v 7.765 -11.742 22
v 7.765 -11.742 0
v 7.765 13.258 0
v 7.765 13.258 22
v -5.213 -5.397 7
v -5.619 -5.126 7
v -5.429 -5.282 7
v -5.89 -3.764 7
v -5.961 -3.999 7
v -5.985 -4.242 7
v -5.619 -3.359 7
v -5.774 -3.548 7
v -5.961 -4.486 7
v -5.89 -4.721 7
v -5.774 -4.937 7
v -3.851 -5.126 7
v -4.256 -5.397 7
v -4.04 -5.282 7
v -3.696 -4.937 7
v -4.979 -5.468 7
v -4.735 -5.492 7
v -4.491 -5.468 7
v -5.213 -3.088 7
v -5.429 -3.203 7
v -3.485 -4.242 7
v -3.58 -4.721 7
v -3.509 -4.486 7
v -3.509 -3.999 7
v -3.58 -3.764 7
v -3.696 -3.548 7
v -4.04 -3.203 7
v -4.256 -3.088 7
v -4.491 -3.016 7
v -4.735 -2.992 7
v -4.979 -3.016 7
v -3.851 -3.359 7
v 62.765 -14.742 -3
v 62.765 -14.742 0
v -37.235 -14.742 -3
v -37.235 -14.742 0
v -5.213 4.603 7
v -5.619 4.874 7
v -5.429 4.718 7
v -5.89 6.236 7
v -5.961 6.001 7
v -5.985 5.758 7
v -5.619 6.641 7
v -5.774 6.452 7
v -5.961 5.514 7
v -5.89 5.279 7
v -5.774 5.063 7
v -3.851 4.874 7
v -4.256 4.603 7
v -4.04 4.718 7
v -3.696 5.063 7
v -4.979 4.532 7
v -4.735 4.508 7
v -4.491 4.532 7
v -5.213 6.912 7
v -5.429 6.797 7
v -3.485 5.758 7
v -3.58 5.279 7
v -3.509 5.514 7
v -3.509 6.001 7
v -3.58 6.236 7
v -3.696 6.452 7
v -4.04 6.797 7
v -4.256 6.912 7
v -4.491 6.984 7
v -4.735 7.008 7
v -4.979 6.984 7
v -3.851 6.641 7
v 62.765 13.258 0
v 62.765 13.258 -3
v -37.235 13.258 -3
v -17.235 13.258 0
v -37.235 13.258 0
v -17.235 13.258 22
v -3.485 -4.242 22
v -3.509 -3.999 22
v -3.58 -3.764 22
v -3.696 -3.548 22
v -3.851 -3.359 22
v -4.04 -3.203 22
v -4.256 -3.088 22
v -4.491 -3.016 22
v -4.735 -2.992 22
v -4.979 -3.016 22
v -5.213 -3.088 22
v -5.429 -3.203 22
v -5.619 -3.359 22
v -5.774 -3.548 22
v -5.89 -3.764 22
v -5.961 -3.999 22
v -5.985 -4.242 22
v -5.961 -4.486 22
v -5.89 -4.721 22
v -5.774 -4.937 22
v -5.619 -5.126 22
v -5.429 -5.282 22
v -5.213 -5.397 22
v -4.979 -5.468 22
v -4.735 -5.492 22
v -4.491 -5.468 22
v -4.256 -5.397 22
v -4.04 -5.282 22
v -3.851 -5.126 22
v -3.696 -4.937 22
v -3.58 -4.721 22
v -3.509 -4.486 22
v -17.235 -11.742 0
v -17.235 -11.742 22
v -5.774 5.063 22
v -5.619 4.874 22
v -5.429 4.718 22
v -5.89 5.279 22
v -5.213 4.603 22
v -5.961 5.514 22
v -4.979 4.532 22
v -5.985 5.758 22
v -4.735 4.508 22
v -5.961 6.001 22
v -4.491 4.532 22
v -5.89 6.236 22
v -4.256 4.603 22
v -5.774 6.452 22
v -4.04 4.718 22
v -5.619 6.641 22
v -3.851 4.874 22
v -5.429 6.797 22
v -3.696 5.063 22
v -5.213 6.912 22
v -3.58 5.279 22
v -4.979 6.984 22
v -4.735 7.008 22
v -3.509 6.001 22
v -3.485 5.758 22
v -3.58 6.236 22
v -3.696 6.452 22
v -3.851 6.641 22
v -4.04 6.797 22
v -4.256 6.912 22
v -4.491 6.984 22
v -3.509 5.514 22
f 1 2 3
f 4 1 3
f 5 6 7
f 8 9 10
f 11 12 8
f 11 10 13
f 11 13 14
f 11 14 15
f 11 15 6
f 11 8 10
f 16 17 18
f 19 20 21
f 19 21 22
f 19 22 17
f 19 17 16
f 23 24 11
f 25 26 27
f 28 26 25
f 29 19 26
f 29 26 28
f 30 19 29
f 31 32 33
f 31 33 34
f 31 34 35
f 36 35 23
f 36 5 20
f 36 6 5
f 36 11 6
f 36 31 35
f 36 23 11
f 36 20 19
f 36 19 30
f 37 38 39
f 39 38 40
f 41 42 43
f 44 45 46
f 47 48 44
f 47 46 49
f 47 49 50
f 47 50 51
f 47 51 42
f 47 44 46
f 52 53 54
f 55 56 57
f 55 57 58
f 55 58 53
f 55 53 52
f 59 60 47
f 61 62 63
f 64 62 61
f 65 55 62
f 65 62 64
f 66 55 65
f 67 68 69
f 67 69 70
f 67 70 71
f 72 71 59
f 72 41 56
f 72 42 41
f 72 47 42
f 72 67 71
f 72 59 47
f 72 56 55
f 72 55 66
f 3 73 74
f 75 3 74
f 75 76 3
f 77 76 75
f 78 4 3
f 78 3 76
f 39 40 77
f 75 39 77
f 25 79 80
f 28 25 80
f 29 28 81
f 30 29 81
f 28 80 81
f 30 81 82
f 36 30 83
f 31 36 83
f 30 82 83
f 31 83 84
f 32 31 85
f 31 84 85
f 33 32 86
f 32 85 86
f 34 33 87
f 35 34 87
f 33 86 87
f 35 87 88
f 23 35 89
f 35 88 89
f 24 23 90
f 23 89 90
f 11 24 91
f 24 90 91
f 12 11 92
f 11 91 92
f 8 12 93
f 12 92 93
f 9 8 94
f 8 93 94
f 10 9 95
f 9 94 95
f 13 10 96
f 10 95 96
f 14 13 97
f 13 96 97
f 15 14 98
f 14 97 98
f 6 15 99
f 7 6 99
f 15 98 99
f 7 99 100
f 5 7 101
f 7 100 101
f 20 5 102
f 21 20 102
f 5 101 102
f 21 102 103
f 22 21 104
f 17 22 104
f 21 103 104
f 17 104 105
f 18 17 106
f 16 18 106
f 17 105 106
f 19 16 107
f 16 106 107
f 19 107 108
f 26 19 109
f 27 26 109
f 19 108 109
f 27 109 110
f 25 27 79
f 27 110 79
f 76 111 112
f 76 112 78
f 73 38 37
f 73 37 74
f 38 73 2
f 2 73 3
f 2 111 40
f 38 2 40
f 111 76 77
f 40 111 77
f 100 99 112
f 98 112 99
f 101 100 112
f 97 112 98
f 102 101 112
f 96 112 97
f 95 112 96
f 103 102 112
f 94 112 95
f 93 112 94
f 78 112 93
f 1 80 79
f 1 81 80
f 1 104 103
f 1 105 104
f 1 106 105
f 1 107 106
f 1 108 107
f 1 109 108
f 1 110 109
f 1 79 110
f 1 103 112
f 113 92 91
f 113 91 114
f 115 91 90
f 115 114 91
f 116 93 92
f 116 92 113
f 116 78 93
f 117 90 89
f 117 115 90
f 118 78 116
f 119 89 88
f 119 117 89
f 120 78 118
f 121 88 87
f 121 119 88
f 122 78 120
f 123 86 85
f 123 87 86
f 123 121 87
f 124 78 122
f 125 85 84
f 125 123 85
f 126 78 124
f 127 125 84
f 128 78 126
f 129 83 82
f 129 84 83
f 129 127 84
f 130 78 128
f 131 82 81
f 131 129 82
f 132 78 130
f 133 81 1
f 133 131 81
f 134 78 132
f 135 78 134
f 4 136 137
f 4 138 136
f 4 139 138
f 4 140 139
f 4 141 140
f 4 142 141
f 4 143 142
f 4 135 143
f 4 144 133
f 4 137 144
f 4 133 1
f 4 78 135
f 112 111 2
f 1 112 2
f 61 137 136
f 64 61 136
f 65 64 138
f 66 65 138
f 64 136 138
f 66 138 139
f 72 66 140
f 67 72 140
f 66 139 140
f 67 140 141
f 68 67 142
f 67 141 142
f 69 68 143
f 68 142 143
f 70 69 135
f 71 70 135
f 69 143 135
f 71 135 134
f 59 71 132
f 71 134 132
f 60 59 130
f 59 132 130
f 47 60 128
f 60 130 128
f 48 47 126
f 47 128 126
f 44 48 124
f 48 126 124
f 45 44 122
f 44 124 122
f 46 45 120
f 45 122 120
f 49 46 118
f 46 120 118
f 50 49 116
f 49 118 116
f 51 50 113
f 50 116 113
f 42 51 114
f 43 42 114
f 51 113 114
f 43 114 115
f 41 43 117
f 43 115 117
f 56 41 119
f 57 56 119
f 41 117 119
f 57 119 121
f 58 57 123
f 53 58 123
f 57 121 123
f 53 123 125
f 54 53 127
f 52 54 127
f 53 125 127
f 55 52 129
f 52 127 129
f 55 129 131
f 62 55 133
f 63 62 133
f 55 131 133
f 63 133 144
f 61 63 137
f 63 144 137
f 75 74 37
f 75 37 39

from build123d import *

# Parameters (mm, degrees)
ESQUISSE1_W             = 25
ESQUISSE1_H             = 25
BOSS_EXTRU_1_DEPTH      = 22
ESQUISSE2_R             = 1.25
ENL_V_MAT_EXTRU_1_DEPTH = 15
ESQUISSE3_W             = 100
ESQUISSE3_H             = 28
BOSS_EXTRU_2_DEPTH      = 3


with BuildPart() as part:
    # Esquisse1 → Boss.-Extru.1 (new body)
    with BuildSketch(Plane.XY):
        with Locations((-4.734848485, 0.757575758)):
            Rectangle(ESQUISSE1_W, ESQUISSE1_H)
    extrude(amount=BOSS_EXTRU_1_DEPTH)

    # Esquisse2 → Enlèv. mat.-Extru.1 (cut)
    with BuildSketch(Plane.XY.offset(22)):
        with Locations((-4.734848485, 5.757575758)):
            Circle(ESQUISSE2_R)
        with Locations((-4.734848485, -4.242424242)):
            Circle(ESQUISSE2_R)
    extrude(amount=-ENL_V_MAT_EXTRU_1_DEPTH, mode=Mode.SUBTRACT)

    # Esquisse3 → Boss.-Extru.2 (add)
    with BuildSketch(Plane(origin=(0, 0, 0), x_dir=(-1, 0, 0), z_dir=(0, 0, -1))):
        with Locations((-12.765151515, -0.742424242)):
            Rectangle(ESQUISSE3_W, ESQUISSE3_H)
    extrude(amount=BOSS_EXTRU_2_DEPTH)


solid = part.part
